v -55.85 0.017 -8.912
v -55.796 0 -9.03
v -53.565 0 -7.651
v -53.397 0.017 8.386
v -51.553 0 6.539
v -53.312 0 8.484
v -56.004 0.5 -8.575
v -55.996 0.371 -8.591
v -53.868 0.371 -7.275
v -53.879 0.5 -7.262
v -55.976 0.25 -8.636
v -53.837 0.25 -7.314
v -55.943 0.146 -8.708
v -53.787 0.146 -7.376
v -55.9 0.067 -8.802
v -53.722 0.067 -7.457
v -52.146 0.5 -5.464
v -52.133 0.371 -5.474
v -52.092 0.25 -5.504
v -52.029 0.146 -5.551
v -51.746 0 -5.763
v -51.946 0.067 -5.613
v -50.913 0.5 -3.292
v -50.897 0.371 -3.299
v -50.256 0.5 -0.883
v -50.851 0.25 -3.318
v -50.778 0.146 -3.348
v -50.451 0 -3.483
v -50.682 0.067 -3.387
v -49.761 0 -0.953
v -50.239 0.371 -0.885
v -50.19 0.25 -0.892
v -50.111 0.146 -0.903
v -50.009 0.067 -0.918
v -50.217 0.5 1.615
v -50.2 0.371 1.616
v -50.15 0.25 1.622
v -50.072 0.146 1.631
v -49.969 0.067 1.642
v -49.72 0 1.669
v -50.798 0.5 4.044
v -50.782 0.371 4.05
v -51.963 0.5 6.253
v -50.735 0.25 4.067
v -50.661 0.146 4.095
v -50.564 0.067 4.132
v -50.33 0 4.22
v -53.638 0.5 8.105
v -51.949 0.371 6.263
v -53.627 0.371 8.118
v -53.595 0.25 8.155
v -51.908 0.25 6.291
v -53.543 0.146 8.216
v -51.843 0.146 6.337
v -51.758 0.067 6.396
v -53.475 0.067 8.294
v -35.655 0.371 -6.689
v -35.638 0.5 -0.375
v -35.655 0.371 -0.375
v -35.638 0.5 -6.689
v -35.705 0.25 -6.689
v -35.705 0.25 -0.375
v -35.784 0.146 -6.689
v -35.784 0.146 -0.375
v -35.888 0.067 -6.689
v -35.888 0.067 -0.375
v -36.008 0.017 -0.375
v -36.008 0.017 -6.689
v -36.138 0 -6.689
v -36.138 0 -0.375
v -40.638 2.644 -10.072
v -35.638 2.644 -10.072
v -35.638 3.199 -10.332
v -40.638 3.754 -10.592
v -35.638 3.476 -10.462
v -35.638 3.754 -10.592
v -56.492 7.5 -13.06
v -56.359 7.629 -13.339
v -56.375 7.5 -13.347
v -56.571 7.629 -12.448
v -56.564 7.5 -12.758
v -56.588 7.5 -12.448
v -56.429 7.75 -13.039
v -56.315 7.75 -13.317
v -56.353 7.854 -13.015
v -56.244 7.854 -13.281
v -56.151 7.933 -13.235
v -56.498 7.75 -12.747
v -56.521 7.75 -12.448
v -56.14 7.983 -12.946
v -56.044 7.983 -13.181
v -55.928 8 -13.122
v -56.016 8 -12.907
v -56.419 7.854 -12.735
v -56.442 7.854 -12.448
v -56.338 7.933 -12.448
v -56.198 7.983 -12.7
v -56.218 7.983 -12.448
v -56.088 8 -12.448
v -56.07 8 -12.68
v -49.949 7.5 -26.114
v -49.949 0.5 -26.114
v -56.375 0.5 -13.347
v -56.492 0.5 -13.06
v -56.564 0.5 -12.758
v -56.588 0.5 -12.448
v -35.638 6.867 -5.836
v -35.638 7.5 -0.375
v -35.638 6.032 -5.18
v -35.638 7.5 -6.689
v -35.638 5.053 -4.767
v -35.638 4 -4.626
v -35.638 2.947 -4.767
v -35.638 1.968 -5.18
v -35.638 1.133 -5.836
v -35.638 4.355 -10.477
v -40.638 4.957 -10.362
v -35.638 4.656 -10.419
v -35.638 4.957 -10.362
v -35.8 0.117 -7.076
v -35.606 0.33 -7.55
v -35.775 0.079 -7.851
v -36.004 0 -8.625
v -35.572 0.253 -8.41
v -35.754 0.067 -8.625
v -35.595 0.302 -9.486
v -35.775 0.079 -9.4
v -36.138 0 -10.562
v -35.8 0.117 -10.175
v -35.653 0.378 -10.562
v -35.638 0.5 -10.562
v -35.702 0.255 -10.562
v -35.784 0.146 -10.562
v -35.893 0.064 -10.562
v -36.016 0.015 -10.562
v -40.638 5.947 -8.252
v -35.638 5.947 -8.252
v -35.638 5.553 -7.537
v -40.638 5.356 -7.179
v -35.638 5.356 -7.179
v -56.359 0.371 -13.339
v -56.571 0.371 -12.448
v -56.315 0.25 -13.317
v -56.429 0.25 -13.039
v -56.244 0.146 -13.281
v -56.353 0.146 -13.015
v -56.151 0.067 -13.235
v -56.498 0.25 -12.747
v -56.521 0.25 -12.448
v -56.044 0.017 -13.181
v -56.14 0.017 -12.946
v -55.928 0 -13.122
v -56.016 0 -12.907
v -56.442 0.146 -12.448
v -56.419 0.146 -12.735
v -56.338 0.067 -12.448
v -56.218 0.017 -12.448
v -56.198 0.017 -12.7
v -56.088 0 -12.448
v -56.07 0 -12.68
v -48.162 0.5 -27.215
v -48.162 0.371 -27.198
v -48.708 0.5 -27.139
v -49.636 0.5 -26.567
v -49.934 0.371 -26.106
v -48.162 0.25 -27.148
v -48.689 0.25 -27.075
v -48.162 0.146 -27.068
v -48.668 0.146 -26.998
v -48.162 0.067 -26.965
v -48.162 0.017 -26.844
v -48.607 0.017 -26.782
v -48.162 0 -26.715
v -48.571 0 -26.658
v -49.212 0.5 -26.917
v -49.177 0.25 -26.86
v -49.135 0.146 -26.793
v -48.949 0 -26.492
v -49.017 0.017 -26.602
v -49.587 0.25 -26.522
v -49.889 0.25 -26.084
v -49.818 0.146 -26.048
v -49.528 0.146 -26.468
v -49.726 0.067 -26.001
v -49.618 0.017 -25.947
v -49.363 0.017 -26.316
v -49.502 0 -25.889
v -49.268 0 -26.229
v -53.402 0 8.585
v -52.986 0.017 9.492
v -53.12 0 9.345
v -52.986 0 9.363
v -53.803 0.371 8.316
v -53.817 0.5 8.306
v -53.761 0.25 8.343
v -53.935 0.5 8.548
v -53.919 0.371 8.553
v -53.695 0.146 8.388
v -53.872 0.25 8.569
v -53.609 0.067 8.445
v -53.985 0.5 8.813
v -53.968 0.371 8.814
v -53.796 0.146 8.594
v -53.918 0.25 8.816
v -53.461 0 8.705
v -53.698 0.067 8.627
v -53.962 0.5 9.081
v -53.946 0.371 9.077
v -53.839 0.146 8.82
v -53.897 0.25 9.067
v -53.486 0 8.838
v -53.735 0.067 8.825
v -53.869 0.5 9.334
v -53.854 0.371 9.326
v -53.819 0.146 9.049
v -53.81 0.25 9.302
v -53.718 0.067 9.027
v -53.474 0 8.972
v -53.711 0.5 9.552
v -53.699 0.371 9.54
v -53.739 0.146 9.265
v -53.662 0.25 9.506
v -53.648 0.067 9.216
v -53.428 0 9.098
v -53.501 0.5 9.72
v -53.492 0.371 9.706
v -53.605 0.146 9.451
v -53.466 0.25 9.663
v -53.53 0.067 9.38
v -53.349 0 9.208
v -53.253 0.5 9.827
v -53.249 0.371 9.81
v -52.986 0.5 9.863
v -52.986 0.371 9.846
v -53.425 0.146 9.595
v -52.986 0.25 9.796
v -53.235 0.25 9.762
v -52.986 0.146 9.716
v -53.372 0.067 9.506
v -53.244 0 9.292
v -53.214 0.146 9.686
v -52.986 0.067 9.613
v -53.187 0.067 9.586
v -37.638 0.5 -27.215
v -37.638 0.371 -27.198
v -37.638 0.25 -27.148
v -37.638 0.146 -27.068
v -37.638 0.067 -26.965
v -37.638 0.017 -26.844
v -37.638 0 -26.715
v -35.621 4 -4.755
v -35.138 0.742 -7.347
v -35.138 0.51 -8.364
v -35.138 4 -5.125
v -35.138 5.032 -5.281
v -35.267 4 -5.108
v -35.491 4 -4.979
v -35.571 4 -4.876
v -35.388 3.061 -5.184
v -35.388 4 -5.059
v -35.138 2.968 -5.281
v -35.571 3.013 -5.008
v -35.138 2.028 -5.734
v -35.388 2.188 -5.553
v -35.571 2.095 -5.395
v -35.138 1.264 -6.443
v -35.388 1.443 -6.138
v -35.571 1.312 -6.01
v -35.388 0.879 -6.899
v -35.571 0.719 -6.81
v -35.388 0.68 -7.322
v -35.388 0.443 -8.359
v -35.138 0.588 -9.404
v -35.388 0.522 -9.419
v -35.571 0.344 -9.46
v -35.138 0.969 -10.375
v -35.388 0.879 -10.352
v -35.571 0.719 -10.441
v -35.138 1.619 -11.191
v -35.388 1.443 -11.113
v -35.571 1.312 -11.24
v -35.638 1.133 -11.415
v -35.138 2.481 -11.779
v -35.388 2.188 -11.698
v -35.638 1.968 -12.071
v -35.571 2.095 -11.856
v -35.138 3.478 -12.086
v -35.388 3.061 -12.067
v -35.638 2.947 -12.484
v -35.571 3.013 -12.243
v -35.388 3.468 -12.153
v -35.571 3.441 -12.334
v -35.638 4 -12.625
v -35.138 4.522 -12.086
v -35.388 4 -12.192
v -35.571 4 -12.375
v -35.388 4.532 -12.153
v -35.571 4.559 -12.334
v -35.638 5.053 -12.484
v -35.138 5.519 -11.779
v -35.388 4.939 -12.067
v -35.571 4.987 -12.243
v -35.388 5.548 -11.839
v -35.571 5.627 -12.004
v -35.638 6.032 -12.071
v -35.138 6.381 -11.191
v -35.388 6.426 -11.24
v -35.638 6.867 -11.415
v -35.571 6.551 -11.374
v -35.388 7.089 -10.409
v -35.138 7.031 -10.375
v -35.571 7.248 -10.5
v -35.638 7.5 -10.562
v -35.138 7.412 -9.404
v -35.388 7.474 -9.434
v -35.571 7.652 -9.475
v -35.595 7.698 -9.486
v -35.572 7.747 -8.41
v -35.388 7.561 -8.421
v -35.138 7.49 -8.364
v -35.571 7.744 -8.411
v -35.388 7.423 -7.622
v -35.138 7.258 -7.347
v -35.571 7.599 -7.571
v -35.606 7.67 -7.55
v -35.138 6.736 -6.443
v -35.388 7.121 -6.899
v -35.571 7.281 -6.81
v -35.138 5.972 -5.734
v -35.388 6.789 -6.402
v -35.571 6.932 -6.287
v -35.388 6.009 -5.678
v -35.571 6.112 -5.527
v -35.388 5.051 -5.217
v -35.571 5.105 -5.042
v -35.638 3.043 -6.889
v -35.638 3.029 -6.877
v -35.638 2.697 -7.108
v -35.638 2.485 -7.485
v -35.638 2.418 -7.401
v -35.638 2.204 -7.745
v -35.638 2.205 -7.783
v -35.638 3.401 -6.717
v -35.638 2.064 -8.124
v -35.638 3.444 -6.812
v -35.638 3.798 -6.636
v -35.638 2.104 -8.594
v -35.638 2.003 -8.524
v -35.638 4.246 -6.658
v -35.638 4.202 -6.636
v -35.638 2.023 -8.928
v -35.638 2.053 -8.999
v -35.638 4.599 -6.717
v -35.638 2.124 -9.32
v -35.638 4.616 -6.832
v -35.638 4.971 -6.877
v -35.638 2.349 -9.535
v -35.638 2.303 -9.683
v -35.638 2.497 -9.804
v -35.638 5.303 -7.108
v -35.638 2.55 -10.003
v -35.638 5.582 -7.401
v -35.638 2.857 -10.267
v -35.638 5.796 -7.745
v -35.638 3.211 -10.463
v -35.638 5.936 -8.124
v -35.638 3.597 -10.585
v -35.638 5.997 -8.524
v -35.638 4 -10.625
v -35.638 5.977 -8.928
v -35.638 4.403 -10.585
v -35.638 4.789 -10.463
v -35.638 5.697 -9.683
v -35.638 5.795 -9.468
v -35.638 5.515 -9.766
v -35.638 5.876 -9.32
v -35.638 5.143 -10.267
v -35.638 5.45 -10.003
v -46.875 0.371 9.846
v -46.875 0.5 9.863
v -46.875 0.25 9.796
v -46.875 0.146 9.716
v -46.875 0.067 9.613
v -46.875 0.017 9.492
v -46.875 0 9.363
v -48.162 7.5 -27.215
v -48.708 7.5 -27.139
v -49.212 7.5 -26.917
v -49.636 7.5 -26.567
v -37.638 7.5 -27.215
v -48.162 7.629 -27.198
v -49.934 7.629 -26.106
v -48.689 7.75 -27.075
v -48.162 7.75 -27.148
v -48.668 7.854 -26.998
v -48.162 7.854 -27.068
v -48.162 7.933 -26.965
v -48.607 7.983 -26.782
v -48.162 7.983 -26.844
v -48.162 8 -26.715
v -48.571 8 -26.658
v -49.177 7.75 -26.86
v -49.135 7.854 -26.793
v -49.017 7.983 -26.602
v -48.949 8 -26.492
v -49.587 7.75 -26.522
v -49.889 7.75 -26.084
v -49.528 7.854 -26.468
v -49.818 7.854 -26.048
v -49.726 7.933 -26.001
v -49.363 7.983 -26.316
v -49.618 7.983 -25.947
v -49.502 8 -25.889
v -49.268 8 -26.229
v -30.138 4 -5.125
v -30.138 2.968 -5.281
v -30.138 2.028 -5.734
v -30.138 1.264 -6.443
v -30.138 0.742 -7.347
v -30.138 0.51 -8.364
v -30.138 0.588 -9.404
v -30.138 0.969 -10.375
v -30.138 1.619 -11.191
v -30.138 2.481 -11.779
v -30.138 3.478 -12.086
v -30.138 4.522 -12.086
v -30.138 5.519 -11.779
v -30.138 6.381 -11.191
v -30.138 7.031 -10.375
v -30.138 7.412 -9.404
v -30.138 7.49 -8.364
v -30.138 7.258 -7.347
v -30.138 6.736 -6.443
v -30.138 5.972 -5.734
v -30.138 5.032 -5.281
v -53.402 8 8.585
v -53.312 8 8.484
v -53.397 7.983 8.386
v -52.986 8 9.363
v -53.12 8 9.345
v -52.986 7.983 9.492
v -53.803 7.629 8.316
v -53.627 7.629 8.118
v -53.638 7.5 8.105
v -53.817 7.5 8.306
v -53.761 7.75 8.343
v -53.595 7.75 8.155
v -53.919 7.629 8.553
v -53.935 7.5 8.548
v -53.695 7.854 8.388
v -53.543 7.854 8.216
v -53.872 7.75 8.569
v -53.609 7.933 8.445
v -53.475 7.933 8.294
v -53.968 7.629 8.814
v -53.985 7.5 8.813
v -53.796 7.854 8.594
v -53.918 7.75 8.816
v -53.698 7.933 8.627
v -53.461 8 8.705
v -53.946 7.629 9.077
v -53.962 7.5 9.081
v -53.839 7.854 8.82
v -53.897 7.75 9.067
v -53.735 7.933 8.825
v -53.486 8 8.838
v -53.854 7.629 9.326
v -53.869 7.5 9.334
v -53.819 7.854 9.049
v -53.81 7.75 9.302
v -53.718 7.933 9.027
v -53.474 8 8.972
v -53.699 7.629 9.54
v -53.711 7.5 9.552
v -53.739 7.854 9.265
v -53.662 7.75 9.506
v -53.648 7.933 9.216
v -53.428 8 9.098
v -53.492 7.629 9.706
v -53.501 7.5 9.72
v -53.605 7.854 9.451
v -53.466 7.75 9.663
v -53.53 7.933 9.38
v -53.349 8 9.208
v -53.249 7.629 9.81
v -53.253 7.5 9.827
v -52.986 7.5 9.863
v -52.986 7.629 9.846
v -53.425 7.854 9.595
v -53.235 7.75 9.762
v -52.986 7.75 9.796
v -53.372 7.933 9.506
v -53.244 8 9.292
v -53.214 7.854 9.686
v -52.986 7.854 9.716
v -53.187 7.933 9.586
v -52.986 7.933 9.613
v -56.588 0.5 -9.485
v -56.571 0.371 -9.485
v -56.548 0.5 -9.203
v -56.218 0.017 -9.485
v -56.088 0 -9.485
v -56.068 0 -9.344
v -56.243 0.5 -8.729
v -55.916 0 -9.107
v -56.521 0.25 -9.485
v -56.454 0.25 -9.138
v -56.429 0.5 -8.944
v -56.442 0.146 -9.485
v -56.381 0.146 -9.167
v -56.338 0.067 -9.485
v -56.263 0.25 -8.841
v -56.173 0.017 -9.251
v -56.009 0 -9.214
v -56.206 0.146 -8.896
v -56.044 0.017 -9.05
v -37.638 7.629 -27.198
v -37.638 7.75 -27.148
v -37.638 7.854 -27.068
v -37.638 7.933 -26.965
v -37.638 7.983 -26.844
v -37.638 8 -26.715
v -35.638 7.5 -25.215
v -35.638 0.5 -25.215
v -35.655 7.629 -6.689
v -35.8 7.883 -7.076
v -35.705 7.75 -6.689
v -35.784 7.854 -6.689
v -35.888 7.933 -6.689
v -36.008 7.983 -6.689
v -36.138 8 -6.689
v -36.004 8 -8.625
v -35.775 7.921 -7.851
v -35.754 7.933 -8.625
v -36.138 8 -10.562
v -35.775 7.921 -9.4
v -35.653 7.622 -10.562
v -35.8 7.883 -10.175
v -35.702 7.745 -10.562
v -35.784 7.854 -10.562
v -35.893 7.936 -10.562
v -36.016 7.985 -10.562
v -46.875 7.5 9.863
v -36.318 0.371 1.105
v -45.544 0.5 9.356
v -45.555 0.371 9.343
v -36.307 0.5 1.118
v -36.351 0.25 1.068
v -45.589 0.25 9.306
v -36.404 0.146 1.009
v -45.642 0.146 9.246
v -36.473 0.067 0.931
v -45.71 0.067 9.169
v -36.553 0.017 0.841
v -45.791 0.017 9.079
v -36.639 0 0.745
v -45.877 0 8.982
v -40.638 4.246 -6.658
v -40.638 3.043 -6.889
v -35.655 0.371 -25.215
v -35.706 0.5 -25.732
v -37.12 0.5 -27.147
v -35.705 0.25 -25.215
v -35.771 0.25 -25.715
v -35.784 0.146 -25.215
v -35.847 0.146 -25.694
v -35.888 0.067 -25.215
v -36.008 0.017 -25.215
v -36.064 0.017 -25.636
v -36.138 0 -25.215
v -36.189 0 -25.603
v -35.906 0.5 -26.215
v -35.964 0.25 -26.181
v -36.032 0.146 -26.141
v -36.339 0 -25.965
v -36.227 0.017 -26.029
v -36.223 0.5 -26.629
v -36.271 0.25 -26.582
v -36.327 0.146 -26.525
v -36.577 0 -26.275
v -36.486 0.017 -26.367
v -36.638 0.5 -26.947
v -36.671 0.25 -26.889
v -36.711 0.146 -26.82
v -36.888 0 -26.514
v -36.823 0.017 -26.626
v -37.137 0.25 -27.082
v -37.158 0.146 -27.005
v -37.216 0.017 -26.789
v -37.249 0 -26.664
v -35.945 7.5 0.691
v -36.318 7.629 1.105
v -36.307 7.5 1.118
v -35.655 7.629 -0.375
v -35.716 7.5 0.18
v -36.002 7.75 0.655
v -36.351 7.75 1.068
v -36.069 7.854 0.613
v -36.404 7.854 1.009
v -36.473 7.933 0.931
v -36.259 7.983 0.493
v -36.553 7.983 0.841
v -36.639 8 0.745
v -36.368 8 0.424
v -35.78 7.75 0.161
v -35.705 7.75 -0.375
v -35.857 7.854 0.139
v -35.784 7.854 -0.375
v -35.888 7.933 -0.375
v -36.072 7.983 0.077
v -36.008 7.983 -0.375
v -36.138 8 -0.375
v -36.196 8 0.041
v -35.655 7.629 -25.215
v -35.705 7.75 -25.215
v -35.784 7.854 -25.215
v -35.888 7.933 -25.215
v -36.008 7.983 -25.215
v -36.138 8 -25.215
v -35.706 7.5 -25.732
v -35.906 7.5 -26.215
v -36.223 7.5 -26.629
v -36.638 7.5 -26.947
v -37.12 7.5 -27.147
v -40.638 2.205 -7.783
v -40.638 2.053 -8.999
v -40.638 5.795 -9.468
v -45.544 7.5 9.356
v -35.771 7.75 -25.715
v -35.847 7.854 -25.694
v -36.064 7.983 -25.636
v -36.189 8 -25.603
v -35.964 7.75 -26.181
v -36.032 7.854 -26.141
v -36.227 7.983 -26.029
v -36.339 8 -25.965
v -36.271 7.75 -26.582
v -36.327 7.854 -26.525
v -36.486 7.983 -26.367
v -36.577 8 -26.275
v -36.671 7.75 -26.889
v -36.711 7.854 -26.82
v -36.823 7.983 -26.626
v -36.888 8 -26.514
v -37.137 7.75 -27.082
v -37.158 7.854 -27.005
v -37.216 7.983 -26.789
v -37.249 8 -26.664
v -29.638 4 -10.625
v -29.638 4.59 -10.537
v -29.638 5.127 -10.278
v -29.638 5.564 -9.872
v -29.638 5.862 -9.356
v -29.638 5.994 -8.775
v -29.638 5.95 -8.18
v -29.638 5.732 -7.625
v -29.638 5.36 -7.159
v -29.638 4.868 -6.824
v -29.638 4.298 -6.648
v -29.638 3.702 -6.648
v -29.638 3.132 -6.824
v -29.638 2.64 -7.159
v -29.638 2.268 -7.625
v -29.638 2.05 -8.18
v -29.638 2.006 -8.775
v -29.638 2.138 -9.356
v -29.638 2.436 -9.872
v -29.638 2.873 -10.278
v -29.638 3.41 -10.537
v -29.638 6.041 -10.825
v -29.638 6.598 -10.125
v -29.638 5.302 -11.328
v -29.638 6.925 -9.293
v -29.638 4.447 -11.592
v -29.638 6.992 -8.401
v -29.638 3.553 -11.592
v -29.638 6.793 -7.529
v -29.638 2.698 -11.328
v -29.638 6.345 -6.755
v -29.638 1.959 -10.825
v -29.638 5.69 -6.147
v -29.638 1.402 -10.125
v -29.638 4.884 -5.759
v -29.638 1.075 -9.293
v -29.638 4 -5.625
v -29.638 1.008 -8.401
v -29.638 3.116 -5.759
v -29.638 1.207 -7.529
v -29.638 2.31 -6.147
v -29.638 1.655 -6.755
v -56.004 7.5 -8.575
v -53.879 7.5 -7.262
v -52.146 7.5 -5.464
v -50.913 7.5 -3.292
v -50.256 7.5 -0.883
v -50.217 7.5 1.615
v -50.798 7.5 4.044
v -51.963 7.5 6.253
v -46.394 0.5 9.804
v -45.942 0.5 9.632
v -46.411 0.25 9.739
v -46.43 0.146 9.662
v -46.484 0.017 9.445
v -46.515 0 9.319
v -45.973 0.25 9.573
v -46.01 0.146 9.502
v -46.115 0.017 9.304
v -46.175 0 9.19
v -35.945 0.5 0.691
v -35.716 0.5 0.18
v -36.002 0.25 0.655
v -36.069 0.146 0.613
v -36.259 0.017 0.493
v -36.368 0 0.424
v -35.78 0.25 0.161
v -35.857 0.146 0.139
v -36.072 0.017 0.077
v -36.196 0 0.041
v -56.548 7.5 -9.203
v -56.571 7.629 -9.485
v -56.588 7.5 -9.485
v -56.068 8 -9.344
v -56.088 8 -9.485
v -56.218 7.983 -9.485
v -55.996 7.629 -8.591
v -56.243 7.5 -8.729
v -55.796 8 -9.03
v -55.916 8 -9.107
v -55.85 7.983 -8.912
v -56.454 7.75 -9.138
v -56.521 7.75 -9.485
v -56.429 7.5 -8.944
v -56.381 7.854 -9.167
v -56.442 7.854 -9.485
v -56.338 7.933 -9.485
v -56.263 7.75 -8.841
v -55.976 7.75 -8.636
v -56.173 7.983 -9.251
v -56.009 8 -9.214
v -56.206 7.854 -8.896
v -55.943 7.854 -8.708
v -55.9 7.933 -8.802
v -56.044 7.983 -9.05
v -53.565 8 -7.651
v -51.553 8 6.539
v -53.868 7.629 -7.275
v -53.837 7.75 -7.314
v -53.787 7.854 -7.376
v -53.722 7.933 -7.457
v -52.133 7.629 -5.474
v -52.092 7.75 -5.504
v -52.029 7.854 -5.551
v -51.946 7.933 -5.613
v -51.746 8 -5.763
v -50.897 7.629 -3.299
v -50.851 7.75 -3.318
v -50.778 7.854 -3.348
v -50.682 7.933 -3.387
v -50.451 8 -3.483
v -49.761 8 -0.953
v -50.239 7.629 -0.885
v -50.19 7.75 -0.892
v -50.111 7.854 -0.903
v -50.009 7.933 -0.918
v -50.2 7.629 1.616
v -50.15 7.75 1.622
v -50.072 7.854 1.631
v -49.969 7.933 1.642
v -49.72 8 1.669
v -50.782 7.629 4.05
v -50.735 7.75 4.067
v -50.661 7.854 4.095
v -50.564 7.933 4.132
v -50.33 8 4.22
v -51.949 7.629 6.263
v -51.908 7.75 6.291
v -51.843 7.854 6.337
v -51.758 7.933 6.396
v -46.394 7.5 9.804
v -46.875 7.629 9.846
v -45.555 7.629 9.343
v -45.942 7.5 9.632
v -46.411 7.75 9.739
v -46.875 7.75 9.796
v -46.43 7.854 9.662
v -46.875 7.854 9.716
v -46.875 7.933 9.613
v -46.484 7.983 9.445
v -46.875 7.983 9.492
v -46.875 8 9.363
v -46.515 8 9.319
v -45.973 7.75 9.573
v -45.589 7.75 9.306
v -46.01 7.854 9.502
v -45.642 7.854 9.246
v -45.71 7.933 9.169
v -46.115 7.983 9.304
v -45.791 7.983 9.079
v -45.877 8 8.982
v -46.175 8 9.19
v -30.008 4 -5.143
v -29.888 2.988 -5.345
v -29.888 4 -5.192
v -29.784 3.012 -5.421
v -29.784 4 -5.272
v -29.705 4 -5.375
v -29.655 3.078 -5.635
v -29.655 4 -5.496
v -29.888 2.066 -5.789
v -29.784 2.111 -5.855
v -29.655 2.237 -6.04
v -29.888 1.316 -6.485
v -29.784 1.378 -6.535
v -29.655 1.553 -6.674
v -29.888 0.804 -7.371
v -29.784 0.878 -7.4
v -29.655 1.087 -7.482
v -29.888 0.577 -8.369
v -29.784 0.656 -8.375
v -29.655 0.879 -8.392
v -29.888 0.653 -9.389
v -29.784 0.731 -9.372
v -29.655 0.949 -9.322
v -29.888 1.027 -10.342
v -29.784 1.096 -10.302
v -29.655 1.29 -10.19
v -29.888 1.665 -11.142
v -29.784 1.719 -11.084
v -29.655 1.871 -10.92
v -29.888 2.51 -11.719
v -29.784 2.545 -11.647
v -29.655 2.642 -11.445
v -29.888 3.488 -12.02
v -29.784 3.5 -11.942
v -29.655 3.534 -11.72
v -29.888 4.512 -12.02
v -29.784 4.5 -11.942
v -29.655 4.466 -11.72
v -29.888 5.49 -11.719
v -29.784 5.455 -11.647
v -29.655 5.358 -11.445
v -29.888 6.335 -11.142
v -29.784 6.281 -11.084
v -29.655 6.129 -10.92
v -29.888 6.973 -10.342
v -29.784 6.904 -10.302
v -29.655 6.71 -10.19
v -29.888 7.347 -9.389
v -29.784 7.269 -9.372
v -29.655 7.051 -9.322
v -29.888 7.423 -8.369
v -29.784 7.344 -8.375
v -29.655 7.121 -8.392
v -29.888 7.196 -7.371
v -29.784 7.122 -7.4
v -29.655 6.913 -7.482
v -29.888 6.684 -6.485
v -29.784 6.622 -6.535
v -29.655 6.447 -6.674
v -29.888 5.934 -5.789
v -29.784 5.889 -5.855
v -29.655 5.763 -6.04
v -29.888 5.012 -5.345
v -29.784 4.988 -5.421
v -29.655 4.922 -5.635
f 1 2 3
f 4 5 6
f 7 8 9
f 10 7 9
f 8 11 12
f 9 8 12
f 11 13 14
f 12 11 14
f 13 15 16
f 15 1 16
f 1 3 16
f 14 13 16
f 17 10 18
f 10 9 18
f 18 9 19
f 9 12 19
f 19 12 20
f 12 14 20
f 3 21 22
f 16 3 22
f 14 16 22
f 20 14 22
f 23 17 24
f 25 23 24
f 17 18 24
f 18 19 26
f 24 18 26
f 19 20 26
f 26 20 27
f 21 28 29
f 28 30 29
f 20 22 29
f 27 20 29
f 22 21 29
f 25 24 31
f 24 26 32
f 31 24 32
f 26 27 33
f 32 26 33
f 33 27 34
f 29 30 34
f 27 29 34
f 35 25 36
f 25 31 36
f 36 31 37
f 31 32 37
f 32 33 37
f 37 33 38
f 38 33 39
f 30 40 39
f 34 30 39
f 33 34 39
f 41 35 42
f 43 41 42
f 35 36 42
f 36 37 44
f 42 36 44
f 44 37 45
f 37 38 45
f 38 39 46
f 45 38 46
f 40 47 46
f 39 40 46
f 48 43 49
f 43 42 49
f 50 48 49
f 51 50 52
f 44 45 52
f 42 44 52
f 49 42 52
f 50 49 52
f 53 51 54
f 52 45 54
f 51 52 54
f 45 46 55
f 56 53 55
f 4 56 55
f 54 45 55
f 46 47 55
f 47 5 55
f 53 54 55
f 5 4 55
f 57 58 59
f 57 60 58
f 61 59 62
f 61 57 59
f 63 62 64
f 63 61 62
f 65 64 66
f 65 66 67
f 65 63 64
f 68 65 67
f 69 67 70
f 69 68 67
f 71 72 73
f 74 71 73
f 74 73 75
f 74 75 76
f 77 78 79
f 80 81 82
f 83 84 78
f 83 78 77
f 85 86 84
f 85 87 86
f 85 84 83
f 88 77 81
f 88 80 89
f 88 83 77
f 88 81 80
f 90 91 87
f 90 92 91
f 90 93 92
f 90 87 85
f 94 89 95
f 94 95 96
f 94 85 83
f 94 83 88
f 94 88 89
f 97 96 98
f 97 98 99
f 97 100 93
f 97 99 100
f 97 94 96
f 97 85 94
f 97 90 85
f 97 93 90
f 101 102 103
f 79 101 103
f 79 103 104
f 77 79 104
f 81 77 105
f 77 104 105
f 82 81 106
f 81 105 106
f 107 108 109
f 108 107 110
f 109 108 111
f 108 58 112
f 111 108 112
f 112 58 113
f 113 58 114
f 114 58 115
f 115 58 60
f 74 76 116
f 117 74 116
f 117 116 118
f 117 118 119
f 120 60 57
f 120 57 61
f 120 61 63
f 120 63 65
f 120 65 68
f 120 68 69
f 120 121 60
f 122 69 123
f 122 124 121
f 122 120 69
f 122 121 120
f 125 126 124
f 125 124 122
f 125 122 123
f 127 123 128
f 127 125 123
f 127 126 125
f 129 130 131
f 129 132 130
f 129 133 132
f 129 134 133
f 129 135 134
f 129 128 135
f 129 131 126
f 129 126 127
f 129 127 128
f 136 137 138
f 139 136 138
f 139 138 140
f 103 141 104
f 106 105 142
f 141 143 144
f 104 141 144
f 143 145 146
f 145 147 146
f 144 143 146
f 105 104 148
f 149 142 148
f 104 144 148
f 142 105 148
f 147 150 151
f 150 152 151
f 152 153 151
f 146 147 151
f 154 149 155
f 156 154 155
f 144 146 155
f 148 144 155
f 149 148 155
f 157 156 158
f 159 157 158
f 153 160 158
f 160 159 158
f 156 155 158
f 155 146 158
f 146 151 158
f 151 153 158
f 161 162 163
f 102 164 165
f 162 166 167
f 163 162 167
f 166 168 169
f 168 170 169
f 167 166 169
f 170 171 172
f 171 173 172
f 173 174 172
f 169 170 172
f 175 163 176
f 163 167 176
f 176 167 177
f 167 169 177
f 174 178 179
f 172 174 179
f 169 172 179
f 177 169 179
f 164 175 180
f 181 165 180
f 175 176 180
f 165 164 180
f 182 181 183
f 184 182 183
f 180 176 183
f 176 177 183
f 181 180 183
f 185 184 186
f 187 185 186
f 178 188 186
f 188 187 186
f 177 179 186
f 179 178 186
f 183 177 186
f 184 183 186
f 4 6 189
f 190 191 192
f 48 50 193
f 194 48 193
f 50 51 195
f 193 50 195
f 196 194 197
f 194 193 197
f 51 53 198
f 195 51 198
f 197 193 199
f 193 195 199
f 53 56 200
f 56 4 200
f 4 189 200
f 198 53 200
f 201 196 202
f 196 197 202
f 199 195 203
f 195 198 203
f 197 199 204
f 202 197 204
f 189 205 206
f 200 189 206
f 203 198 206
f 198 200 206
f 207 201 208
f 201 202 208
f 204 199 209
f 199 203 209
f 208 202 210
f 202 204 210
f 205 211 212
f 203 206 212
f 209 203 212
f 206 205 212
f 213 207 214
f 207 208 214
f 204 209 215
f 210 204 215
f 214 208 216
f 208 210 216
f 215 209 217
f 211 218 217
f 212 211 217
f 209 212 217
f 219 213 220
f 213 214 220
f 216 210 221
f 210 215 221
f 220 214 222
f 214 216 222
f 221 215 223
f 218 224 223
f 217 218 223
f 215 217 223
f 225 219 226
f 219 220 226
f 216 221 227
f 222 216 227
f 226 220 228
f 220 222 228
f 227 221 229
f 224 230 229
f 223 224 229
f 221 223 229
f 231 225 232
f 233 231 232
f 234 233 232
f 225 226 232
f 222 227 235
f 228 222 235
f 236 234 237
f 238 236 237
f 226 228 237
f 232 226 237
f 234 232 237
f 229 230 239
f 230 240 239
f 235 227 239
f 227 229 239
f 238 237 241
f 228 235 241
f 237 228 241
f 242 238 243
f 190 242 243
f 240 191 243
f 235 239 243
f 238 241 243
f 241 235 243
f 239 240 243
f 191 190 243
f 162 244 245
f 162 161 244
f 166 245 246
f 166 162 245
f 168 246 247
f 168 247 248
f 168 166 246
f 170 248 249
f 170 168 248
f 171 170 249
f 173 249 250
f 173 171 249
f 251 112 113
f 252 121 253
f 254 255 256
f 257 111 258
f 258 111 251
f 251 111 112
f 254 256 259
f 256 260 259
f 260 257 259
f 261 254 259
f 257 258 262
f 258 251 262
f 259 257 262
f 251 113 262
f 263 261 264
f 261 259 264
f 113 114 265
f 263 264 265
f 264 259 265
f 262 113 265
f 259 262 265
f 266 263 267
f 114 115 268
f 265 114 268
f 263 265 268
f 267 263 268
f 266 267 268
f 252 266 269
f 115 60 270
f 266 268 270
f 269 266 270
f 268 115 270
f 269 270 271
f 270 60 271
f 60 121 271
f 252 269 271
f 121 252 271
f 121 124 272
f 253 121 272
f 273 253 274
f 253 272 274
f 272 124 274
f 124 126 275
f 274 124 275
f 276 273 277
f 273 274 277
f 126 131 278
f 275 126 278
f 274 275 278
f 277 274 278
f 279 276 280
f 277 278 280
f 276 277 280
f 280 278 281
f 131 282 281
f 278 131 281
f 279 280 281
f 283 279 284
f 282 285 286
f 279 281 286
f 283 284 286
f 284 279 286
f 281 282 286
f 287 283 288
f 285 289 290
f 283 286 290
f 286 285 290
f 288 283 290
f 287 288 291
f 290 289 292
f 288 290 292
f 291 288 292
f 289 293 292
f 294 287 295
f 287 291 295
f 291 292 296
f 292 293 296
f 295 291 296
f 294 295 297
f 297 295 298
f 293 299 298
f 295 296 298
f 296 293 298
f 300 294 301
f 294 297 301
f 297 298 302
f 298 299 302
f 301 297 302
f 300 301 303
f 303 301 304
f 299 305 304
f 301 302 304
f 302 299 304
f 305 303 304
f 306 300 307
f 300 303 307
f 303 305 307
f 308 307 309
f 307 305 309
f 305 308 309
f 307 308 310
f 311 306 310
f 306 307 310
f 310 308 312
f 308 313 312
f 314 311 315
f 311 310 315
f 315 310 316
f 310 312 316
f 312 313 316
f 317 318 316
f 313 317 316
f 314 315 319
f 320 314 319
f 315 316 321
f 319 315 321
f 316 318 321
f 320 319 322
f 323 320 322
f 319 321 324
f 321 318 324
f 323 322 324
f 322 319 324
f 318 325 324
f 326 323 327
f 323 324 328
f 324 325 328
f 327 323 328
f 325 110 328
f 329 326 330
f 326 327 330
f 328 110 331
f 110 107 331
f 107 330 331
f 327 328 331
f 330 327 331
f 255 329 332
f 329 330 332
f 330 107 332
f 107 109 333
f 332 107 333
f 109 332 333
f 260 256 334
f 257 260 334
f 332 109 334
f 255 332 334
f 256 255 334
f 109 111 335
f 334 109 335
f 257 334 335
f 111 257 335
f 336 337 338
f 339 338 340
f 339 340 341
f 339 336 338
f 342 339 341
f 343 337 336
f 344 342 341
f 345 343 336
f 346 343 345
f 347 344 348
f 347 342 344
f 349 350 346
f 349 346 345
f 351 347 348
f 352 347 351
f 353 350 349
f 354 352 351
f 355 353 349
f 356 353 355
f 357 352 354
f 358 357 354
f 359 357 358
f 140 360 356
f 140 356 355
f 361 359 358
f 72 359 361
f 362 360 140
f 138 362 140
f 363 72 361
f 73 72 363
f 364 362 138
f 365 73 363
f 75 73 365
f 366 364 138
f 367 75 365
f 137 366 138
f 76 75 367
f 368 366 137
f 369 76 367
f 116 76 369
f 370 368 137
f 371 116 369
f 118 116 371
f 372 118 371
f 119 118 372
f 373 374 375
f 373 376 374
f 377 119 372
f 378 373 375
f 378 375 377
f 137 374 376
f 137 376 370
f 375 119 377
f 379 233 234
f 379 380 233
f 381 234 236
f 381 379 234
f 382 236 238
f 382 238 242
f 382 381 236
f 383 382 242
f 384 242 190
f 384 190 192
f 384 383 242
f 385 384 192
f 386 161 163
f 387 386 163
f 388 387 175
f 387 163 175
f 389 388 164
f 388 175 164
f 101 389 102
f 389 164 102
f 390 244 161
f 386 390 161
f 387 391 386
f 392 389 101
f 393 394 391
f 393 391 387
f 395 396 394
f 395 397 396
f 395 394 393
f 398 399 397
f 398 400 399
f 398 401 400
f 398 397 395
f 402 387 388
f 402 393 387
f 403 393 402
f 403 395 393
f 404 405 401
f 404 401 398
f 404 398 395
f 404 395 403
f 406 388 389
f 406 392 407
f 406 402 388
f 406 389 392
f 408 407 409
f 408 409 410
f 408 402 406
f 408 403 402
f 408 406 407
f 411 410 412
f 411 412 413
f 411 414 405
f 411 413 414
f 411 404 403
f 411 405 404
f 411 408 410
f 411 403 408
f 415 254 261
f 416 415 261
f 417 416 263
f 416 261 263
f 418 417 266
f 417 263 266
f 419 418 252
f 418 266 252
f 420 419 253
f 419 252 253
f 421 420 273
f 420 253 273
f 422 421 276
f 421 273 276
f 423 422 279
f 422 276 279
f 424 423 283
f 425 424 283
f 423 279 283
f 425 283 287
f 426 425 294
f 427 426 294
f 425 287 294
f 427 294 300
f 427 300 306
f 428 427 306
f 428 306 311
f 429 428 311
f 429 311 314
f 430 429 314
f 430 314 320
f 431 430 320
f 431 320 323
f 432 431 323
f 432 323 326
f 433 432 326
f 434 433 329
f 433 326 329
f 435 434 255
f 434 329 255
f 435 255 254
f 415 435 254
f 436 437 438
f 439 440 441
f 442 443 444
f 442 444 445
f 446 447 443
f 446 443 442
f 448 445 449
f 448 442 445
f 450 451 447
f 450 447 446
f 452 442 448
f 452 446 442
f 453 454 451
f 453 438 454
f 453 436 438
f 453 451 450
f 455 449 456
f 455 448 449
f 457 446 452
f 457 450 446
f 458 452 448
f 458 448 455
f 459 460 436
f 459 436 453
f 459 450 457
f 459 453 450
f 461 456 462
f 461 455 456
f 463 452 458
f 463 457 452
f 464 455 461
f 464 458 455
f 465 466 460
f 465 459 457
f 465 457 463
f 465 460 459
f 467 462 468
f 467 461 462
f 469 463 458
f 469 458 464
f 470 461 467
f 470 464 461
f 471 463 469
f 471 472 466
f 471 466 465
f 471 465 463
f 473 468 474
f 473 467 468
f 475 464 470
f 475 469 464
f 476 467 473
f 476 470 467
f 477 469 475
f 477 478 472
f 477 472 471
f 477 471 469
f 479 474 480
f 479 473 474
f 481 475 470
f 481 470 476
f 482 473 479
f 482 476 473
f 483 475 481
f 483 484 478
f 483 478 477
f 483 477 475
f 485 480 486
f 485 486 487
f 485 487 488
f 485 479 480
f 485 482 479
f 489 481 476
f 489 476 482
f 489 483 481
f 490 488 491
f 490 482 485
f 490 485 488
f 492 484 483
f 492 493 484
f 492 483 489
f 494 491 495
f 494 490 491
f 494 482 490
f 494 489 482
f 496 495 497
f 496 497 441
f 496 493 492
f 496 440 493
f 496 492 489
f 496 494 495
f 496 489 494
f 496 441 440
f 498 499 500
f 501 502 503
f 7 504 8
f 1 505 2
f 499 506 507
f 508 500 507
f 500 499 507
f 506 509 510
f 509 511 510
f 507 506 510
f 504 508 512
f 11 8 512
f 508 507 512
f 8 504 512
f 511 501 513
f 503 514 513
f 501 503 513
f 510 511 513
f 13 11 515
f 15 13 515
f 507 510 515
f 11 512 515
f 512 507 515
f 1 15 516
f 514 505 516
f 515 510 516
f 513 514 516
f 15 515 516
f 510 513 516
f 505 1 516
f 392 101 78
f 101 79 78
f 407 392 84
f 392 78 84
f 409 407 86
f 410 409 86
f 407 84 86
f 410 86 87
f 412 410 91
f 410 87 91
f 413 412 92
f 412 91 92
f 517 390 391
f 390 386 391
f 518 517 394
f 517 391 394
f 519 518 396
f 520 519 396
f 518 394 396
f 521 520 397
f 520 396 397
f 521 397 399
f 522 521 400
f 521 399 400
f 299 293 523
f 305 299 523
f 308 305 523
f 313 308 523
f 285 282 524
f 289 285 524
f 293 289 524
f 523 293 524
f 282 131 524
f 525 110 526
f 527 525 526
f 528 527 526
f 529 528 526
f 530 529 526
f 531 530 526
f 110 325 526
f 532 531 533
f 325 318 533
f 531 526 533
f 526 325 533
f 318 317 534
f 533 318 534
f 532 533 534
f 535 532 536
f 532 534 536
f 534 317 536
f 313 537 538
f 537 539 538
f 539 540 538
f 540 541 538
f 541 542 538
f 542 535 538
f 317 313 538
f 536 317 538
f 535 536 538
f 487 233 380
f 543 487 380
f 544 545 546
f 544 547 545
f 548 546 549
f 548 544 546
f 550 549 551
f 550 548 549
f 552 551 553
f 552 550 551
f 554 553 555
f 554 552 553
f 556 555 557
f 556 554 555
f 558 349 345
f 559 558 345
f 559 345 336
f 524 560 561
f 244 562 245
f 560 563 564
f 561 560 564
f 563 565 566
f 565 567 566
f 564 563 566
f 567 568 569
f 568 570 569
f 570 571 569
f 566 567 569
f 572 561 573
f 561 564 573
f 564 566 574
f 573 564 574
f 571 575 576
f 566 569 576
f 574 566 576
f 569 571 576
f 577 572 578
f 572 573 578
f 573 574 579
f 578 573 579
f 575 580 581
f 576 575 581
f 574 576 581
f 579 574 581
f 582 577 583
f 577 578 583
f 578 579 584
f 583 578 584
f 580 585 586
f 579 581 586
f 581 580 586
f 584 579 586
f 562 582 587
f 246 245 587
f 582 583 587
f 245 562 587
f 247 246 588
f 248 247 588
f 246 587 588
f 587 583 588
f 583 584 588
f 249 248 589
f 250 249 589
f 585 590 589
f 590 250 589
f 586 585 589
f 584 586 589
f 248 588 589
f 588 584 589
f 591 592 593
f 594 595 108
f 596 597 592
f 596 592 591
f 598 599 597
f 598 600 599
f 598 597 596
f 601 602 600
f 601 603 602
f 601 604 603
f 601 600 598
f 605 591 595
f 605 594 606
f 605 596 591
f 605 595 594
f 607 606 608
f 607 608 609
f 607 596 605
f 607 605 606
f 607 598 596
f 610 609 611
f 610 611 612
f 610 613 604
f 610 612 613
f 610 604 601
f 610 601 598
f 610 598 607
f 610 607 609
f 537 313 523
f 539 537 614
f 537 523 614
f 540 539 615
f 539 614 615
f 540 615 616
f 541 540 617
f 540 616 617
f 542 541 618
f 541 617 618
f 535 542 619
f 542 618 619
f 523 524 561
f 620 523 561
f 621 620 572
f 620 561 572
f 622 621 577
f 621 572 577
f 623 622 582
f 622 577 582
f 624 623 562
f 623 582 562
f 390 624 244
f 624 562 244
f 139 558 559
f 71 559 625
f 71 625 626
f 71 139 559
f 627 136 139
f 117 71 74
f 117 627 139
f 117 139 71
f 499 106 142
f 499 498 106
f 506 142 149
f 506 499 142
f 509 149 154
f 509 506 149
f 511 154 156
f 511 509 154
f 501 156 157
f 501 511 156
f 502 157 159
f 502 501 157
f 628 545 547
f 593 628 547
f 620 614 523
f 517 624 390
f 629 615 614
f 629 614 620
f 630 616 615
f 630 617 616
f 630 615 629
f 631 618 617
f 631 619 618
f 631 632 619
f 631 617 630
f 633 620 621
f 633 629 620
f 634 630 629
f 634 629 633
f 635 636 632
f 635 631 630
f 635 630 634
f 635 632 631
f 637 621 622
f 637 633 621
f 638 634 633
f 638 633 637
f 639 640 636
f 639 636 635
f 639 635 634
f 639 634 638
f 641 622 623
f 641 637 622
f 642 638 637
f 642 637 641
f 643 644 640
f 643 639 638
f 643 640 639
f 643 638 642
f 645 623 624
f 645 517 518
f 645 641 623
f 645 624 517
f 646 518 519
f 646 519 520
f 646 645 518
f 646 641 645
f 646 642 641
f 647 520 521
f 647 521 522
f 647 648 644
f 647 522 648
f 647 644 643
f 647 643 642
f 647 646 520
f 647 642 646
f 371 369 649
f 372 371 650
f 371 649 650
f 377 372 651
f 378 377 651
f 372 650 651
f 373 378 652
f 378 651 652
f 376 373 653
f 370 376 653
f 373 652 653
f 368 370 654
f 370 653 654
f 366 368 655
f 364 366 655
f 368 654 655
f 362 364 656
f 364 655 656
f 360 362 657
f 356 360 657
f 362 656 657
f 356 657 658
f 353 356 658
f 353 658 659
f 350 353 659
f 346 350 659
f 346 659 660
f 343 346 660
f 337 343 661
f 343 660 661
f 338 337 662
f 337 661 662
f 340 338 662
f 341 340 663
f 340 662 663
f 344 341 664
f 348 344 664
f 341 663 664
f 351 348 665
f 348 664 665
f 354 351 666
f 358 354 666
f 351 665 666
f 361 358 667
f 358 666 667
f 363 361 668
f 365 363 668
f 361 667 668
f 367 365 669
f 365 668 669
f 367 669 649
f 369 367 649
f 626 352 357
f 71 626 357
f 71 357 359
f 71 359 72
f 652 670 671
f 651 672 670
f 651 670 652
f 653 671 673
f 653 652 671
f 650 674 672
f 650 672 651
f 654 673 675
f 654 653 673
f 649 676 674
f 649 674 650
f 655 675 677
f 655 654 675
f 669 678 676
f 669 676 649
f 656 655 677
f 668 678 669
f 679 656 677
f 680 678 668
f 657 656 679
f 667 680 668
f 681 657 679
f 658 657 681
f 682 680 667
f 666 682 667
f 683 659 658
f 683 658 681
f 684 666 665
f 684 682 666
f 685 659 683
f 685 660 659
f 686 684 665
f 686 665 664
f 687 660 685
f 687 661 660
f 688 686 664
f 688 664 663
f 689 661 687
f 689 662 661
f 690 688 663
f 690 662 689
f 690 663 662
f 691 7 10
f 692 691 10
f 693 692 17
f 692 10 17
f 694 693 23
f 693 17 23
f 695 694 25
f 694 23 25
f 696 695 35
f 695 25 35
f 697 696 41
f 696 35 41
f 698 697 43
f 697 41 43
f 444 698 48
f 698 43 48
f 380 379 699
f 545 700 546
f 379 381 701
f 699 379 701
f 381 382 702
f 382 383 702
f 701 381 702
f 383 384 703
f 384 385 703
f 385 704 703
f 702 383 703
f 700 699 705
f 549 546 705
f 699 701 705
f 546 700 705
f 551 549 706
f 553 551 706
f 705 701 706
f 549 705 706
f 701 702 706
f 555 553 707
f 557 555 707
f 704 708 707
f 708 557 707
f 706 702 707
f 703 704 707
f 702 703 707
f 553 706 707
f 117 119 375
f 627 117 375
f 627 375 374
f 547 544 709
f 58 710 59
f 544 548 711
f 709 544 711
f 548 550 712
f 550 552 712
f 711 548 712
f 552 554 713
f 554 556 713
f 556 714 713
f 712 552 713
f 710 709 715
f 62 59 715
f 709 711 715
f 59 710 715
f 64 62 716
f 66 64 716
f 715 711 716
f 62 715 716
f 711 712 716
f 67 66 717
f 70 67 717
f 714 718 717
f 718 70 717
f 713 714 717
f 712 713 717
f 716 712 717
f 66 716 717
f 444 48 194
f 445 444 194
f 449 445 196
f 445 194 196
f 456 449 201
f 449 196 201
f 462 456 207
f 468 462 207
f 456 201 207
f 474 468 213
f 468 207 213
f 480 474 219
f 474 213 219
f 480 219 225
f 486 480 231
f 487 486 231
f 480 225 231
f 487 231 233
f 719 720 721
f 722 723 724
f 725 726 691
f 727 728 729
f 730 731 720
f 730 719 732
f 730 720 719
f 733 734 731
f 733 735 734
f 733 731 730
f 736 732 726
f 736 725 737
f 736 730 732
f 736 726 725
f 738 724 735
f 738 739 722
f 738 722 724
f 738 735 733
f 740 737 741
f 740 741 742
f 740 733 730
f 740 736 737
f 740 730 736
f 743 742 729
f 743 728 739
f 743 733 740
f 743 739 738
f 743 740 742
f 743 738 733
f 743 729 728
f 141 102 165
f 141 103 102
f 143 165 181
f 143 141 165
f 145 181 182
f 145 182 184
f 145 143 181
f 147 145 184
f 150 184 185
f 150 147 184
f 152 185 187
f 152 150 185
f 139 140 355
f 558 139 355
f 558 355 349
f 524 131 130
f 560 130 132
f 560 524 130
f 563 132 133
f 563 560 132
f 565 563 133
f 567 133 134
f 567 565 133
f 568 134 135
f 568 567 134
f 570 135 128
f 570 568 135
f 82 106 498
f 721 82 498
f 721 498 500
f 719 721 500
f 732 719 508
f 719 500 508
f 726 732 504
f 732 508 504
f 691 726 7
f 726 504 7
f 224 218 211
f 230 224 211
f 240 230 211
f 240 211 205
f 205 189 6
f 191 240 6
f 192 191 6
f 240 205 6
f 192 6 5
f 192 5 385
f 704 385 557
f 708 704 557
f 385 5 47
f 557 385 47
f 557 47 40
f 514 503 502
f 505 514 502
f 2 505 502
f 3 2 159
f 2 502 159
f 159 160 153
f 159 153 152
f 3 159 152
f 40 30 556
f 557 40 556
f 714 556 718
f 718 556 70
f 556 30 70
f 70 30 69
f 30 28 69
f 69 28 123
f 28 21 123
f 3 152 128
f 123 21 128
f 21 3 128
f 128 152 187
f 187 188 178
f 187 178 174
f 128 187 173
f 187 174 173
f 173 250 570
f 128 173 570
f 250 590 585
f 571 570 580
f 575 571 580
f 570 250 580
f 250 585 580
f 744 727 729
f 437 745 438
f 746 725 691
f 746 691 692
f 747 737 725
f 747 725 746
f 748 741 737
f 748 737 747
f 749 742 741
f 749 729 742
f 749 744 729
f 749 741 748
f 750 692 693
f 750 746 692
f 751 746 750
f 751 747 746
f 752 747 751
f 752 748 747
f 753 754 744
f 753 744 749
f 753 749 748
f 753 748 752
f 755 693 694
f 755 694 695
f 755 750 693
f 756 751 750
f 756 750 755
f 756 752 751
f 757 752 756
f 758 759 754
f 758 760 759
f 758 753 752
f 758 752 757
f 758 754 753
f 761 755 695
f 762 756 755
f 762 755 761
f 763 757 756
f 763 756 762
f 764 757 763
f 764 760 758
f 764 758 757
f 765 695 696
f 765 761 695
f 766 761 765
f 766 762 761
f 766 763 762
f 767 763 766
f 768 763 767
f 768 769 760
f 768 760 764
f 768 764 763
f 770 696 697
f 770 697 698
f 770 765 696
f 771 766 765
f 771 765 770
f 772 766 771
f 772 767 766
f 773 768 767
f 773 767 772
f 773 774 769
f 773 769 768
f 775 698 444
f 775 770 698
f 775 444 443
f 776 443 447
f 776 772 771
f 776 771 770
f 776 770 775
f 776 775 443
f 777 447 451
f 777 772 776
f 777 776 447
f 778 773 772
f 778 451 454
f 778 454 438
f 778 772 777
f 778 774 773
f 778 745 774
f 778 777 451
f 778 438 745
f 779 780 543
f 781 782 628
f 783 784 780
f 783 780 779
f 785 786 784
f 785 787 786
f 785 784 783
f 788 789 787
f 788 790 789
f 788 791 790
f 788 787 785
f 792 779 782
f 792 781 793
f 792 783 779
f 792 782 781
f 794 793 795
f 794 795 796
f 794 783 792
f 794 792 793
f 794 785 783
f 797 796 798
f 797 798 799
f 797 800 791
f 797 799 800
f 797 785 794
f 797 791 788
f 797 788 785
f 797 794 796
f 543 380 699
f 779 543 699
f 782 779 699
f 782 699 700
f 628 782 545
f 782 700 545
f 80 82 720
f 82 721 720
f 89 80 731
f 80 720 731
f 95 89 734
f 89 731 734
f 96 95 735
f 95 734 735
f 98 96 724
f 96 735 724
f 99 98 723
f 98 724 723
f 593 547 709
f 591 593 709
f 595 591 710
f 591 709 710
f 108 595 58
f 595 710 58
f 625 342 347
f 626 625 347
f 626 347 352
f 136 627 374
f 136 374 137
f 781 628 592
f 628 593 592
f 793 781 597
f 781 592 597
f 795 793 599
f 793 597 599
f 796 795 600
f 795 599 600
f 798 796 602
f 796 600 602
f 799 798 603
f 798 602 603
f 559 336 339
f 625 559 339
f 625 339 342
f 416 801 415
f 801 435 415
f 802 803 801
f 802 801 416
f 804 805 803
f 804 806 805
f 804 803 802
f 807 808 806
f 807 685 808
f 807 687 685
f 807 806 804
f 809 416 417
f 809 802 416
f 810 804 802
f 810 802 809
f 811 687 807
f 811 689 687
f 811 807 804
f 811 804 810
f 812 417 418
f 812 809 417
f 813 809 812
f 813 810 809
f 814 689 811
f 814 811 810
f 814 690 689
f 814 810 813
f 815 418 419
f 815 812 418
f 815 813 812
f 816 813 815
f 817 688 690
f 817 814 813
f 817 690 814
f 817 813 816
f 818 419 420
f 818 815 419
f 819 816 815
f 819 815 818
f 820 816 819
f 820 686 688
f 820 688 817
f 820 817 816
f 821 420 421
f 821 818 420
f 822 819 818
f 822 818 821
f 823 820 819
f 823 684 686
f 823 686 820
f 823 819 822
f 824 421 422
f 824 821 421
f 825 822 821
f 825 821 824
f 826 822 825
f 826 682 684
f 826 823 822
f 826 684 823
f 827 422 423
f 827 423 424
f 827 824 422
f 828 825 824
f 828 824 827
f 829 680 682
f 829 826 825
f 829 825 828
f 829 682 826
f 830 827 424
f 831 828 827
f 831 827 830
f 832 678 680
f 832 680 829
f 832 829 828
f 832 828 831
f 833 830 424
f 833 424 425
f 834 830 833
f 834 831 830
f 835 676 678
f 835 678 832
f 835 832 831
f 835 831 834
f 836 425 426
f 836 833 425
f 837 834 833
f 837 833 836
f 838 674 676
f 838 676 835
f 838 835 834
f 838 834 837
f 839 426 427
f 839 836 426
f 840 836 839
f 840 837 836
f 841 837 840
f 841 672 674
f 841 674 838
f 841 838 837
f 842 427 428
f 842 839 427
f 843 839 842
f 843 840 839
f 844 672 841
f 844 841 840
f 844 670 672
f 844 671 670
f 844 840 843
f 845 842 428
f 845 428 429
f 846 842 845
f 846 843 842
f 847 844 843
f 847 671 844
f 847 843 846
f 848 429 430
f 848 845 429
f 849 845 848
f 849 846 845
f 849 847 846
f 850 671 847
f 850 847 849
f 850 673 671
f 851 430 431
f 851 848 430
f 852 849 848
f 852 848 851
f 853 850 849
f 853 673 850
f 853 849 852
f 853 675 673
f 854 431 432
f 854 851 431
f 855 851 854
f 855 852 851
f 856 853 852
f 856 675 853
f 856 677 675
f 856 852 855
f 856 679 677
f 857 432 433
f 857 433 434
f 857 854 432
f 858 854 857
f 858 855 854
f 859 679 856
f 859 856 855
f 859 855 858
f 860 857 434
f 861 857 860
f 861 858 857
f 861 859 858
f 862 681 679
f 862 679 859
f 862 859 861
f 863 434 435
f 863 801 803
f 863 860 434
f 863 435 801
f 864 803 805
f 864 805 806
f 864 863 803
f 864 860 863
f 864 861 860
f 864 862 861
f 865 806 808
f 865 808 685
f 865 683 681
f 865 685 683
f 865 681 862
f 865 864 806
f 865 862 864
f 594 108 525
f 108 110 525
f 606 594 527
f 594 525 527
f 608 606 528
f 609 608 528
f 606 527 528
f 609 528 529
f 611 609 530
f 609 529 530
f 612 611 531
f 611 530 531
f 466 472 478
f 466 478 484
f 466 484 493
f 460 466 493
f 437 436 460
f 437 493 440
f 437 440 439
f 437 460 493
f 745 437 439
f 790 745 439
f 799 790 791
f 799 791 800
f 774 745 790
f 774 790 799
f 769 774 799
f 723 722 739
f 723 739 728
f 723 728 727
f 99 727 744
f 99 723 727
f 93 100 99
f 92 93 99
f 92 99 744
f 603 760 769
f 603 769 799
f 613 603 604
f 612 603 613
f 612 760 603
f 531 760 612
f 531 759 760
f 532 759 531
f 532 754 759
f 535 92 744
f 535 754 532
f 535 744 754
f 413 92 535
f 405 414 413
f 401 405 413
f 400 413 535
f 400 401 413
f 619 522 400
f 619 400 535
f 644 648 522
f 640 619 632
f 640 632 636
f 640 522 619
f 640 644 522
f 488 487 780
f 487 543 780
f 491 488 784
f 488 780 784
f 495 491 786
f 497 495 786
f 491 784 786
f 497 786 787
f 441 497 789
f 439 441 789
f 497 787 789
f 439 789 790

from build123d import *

# Parameters (mm, degrees)
BOSS_EXTRUDE3_DEPTH = 8
SKETCH5_R           = 3.5
BOSS_EXTRUDE4_DEPTH = 6
CUT_EXTRUDE4_DEPTH  = 11
SKETCH8_R           = 2
CUT_EXTRUDE6_DEPTH  = 6
FILLET4_R           = 0.5
FILLET5_R           = 0.5
FILLET6_R           = 0.5
FILLET7_R           = 0.5


with BuildPart() as part:
    # Sketch2 → Boss-Extrude3 (new body)
    with BuildSketch(Plane(origin=(0, 0, 0), x_dir=(1, 0, 0), z_dir=(0, 1, 0))):
        with BuildLine():
            Line((-52.986366507, -9.86293556), (-46.875173859, -9.86293556))
            ThreePointArc((-46.875173859, -9.86293556), (-46.162915062, -9.731808859), (-45.544052412, -9.355622967))
            Line((-45.544052412, -9.355622967), (-36.306548093, -1.117970492))
            ThreePointArc((-36.306548093, -1.117970492), (-35.812533532, -0.443133043), (-35.63766954, 0.374716915))
            Line((-35.63766954, 0.374716915), (-35.63766954, 25.214712135))
            ThreePointArc((-35.63766954, 25.214712135), (-36.223455977, 26.628925698), (-37.63766954, 27.214712135))
            Line((-37.63766954, 27.214712135), (-48.162498073, 27.214712135))
            ThreePointArc((-48.162498073, 27.214712135), (-49.211705906, 26.91740498), (-49.948976743, 26.113875058))
            Line((-49.948976743, 26.113875058), (-56.374690107, 13.347112122))
            ThreePointArc((-56.374690107, 13.347112122), (-56.534099068, 12.910032882), (-56.588211437, 12.4479492))
            Line((-56.588211437, 12.4479492), (-56.588211437, 9.484742958))
            ThreePointArc((-56.588211437, 9.484742958), (-56.429448332, 8.944076251), (-56.003570463, 8.575085396))
            ThreePointArc((-56.003570463, 8.575085396), (-50.256216568, 0.882541429), (-53.63825689, -8.104622347))
            ThreePointArc((-53.63825689, -8.104622347), (-53.924000021, -9.210560924), (-52.986366507, -9.86293556))
        make_face()
    extrude(amount=BOSS_EXTRUDE3_DEPTH)

    # Sketch5 → Boss-Extrude4 (add)
    with BuildSketch(Plane(origin=(-35.63766954, 0, 0), x_dir=(0, 0, -1), z_dir=(1, 0, 0))):
        with Locations(Location((8.625486842, 4, 0), (0, 0, 180))):
            Circle(SKETCH5_R)
    extrude(amount=BOSS_EXTRUDE4_DEPTH)

    # Sketch6 → Cut-Extrude4 (cut)
    with BuildSketch(Plane(origin=(-29.63766954, 0, 0), x_dir=(0, 0, -1), z_dir=(1, 0, 0))):
        Polygon((9.467738832, 5.794574307), (8.252058704, 5.946904411), (7.179015432, 5.355583202), (6.658475074, 4.246475285), (6.889266356, 3.043222187), (7.783234851, 2.205425693), (8.99891498, 2.053095589), (10.071958252, 2.644416798), (10.592498609, 3.753524715), (10.361707327, 4.956777813), align=None)
    extrude(amount=-CUT_EXTRUDE4_DEPTH, mode=Mode.SUBTRACT)

    # Sketch8 → Cut-Extrude6 (cut)
    with BuildSketch(Plane(origin=(-29.63766954, 0, 0), x_dir=(0, 0, -1), z_dir=(1, 0, 0))):
        with Locations((8.625486842, 4)):
            Circle(SKETCH8_R)
    extrude(amount=-CUT_EXTRUDE6_DEPTH, mode=Mode.SUBTRACT)

    # Fillet4
    fillet4_edges = [part.edges().sort_by_distance(p)[0] for p in [
        (-29.63766954, 4, -12.125486842),
    ]]
    fillet(fillet4_edges, radius=FILLET4_R)

    # Fillet5
    fillet5_edges = [part.edges().sort_by_distance(p)[0] for p in [
        (-35.63766954, 4, -12.125486842),
    ]]
    fillet(fillet5_edges, radius=FILLET5_R - 0.0001)  # a hair under: the kernel refuses the full size

    # Fillet6
    fillet6_edges = [part.edges().sort_by_distance(p)[0] for p in [
        (-35.63766954, 8, -12.794714525),
        (-49.211705906, 8, -26.91740498),
        (-53.161833425, 8, -19.73049359),
        (-56.534099068, 8, -12.910032882),
        (-56.588211437, 8, -10.966346079),
        (-56.429448332, 8, -8.944076251),
        (-50.256216568, 8, -0.882541429),
        (-53.924000021, 8, 9.210560924),
        (-49.930770183, 8, 9.86293556),
        (-46.162915062, 8, 9.731808859),
        (-40.925300253, 8, 5.236796729),
        (-36.223455977, 8, -26.628925698),
        (-35.812533532, 8, 0.443133043),
        (-35.63766954, 8, -12.794714525),
        (-42.900083806, 8, -27.214712135),
    ]]
    fillet(fillet6_edges, radius=FILLET6_R)

    # Fillet7
    fillet7_edges = [part.edges().sort_by_distance(p)[0] for p in [
        (-35.63766954, 0, -12.794714525),
        (-35.63766954, 0, -12.794714525),
        (-35.812533532, 0, 0.443133043),
        (-40.925300253, 0, 5.236796729),
        (-46.162915062, 0, 9.731808859),
        (-49.930770183, 0, 9.86293556),
        (-53.924000021, 0, 9.210560924),
        (-50.256216568, 0, -0.882541429),
        (-56.429448332, 0, -8.944076251),
        (-56.588211437, 0, -10.966346079),
        (-56.534099068, 0, -12.910032882),
        (-53.161833425, 0, -19.73049359),
        (-49.211705906, 0, -26.91740498),
        (-42.900083806, 0, -27.214712135),
        (-36.223455977, 0, -26.628925698),
    ]]
    fillet(fillet7_edges, radius=FILLET7_R)


solid = part.part
